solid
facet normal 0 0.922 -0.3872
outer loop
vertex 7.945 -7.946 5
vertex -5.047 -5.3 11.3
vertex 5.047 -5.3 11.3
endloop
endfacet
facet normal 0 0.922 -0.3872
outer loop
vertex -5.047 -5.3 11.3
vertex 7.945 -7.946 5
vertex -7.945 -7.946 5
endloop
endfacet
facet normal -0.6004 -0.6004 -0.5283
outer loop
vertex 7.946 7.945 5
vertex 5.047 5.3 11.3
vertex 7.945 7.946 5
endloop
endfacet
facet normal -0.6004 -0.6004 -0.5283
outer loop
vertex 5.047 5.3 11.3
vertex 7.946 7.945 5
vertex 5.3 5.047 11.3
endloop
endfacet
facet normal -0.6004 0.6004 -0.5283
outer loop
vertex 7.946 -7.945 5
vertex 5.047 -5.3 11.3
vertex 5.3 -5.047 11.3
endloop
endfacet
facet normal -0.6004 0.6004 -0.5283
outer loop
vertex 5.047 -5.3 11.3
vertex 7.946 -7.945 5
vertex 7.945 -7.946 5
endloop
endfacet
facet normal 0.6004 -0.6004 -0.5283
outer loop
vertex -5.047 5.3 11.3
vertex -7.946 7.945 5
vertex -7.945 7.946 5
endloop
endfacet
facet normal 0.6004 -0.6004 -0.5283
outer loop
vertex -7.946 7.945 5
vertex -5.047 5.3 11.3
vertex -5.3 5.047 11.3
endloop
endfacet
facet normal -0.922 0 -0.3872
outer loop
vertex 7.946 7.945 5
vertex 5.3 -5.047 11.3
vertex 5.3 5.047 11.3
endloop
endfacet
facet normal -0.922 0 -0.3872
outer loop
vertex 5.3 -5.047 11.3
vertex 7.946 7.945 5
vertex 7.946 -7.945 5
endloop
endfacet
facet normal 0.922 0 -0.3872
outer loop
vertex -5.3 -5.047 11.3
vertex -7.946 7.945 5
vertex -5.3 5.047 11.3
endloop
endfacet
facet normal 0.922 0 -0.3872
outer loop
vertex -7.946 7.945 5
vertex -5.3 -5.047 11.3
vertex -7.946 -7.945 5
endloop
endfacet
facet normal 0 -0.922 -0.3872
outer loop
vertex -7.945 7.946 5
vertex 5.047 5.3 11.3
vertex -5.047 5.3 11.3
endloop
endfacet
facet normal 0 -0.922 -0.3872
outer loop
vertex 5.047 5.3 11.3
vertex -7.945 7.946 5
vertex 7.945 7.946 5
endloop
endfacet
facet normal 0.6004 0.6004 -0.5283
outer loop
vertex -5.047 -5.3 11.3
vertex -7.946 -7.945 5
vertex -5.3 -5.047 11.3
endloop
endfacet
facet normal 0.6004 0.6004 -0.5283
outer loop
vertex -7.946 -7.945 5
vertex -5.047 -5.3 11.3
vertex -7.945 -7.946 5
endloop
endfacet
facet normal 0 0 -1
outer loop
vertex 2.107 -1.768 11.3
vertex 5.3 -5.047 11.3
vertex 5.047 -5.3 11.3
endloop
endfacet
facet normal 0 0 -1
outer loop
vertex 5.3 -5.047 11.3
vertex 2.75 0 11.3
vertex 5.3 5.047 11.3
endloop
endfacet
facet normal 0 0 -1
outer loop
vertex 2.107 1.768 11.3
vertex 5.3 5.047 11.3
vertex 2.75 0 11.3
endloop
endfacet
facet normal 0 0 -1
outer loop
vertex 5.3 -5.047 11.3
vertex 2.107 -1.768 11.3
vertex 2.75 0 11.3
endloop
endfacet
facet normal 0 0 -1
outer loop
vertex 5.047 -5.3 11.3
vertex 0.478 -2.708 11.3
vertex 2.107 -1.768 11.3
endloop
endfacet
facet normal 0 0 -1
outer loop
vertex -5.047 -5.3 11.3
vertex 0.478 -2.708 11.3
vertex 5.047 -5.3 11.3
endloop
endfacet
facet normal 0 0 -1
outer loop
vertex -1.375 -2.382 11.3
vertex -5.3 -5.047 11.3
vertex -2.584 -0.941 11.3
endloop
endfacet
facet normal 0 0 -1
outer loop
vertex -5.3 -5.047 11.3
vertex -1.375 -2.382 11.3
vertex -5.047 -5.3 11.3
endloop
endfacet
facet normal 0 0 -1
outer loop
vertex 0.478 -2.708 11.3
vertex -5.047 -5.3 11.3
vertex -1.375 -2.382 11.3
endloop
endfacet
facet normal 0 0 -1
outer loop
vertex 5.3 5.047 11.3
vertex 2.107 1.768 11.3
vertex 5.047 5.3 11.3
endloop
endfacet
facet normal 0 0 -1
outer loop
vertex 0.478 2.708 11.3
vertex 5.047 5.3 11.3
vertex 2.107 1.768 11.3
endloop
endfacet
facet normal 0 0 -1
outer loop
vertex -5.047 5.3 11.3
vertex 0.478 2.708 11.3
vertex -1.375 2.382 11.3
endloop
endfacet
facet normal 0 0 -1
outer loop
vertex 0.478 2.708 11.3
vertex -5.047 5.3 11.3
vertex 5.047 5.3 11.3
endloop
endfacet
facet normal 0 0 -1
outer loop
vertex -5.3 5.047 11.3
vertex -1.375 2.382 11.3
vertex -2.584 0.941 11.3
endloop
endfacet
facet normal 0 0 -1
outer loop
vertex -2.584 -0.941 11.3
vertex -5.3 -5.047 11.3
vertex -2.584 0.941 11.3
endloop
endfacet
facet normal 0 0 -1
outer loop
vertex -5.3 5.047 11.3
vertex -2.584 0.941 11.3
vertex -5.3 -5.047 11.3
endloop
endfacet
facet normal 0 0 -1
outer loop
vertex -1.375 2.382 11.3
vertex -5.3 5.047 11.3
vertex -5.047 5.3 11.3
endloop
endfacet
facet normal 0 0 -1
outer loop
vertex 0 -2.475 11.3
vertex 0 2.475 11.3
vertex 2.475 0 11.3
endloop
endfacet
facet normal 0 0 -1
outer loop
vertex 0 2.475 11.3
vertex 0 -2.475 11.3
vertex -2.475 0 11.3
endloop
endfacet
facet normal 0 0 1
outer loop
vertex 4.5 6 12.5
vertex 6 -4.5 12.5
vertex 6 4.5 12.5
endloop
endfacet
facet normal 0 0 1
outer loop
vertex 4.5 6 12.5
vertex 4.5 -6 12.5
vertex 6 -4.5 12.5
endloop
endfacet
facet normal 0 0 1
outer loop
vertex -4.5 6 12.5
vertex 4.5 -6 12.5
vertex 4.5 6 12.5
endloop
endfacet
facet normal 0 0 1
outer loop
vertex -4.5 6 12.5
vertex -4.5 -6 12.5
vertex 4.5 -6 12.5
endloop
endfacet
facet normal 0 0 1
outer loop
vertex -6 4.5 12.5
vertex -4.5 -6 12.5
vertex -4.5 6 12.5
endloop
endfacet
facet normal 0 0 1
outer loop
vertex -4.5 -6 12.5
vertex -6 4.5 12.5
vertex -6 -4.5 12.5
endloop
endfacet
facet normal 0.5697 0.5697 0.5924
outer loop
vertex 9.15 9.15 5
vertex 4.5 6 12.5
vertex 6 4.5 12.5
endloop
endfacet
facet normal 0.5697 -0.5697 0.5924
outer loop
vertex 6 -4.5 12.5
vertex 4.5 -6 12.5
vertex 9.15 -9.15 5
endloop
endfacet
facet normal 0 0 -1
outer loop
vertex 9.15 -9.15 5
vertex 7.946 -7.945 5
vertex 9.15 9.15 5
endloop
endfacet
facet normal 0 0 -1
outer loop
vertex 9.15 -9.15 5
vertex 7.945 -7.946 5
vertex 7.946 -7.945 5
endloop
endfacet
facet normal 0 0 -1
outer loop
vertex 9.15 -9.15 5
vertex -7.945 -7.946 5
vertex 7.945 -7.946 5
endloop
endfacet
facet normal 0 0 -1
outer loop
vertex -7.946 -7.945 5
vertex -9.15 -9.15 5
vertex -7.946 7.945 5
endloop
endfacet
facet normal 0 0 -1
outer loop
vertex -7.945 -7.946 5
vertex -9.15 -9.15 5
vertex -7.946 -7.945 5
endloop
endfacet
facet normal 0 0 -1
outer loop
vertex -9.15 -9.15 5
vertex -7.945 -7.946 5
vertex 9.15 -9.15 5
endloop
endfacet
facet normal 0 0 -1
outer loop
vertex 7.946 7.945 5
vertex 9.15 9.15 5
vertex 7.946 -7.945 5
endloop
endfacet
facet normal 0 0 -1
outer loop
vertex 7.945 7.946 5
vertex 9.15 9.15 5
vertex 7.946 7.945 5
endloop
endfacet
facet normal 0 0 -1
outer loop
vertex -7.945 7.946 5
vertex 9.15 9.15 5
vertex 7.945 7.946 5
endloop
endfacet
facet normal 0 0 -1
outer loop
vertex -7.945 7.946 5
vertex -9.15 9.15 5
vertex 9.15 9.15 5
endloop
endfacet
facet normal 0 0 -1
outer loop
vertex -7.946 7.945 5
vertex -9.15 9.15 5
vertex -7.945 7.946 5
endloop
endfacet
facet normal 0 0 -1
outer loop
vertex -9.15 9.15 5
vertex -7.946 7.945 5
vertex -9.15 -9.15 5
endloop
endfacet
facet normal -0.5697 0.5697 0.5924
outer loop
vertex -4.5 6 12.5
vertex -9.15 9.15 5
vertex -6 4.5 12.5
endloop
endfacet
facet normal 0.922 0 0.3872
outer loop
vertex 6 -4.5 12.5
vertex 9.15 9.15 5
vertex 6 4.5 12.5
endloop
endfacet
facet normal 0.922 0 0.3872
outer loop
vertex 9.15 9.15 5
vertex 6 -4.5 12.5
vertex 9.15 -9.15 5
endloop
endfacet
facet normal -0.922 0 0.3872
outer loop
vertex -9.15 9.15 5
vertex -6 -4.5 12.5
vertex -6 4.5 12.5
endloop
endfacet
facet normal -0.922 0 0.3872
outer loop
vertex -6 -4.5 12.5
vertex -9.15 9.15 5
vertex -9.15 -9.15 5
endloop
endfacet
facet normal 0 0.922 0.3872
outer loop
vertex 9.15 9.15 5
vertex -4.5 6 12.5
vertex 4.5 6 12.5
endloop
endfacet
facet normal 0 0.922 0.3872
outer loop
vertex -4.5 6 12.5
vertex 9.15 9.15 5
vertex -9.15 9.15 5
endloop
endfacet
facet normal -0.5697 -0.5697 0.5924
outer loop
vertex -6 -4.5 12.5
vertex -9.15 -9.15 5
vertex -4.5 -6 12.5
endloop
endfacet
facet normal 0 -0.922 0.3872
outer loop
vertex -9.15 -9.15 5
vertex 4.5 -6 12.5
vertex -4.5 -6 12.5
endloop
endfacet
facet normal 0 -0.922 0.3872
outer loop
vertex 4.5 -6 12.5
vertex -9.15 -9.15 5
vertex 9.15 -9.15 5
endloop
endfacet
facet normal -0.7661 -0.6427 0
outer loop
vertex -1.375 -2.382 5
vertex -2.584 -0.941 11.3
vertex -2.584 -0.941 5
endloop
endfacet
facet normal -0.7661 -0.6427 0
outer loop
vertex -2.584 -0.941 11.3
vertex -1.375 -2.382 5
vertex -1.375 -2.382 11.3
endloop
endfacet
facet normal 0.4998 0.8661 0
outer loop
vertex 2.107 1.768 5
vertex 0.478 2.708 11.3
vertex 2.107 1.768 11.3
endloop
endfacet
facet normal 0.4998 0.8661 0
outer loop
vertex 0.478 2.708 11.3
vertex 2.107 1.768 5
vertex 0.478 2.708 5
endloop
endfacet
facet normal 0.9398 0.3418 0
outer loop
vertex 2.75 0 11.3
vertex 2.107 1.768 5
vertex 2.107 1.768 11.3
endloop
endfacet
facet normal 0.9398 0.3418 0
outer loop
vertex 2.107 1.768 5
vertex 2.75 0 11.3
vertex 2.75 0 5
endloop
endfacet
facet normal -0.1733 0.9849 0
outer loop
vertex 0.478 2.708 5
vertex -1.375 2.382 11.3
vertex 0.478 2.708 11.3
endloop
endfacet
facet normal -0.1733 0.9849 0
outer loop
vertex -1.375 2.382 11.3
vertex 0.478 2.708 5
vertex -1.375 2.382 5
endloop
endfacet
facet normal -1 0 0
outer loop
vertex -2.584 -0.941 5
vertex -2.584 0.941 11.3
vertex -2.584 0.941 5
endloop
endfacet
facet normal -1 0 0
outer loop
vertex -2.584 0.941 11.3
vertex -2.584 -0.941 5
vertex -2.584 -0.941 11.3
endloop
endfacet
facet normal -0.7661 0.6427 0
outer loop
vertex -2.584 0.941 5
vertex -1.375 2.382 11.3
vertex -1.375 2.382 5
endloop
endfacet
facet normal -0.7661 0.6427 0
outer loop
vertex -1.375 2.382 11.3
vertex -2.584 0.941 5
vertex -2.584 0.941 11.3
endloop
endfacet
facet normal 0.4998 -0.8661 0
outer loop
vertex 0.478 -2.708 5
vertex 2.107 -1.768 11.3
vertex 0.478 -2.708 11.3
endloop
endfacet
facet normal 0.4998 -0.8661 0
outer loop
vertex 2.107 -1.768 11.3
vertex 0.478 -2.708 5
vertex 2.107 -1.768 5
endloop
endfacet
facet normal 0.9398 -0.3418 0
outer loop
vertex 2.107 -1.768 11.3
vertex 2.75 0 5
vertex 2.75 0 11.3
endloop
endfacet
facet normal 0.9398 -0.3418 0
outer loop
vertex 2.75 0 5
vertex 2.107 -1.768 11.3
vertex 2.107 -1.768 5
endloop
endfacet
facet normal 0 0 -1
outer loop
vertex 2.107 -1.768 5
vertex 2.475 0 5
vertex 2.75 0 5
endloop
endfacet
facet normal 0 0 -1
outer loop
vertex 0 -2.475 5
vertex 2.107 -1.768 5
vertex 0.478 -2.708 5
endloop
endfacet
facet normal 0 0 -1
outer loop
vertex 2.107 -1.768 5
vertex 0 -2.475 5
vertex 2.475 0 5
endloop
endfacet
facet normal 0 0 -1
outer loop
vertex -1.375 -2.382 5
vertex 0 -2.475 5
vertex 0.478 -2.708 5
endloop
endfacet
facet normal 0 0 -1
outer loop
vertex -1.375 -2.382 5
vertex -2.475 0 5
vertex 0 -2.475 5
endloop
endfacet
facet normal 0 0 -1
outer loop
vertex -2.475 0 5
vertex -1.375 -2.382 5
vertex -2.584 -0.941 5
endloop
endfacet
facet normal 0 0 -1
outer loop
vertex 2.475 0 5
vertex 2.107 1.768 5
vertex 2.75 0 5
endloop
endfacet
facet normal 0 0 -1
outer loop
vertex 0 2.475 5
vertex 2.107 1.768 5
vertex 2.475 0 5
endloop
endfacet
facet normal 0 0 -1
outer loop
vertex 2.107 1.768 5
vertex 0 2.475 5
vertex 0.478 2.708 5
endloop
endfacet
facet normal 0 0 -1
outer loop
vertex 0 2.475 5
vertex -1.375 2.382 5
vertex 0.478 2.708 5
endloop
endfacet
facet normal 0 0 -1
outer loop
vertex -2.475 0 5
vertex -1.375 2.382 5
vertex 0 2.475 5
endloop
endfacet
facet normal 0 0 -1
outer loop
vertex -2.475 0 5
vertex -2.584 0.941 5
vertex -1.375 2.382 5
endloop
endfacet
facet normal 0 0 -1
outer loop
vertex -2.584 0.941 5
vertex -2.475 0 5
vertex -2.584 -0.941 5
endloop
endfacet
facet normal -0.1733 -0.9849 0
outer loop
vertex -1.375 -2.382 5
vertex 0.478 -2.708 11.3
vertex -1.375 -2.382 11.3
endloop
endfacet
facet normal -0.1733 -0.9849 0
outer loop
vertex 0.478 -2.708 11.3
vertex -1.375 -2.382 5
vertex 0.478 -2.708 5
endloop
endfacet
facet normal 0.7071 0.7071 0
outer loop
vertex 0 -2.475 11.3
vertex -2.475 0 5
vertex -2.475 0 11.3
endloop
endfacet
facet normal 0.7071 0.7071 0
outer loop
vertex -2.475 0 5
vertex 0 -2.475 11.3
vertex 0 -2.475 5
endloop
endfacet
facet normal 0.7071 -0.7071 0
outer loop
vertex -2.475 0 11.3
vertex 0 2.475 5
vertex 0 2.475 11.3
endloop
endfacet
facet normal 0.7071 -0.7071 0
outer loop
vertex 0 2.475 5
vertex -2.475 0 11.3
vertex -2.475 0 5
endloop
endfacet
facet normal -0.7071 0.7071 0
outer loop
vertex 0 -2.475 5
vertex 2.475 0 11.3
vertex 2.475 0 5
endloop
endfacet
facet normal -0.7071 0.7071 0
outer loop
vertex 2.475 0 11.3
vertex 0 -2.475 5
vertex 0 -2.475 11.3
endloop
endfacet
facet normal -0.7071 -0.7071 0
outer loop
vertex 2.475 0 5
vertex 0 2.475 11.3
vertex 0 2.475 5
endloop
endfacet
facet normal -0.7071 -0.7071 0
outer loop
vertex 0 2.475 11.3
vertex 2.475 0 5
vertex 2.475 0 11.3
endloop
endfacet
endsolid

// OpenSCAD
// file: utils.scad
module rounded_square(size=1, center=false, r=1) {
  offset(r)
    offset(-r)
      square(size, center=center);
}

module chamfered_pocket(size=1, h=1) {
  intersection() {
    hull() {
      translate([0,0,h/2])
        cube([size.x, size.y, h], center=true);

      translate([0,0,1.5*h])
        cube([size.x+h*2, size.y+h*2, h], center=true);
    }
    translate([0,0,0.5*h])
      cube([size.x+h*2, size.y+h*2, h], center=true);
  }
}
// main file
use <utils.scad>

module keycap_shape(d1=18.3, d2=12, h=7.5, r=1.5) {
  hull() {
    linear_extrude(1, scale=0.1) square([d1, d1], center=true);
    translate([0, 0, h])
      rotate([180,0,0])
      linear_extrude(1, scale=0.1)
      rounded_square([d2,d2], r=r, center=true);
  }
}

module keycap(down=false) {
  w=1.2;
  translate([0,0,down?1:5]) {
    difference() {
      keycap_shape(d1=18.3, d2=12, h=7.5, r=1.5);
      intersection() {
        translate([0,0,-0.01]) keycap_shape(d1=18.3-2*w, d2=12-2*w, h=7.5, r=1.5-w);
        cube([20, 20, (7.5-w)*2], center=true);
      }
    }
    difference() {
      cylinder(h=7, d=5.5);
      rotate([0,0,45]) cube([3.5, 3.5, 20], center=true);
    }
  }
}

module switch() {
    translate([0,0,-5]) linear_extrude(6) rounded_square([13.5,13.5], r=1, center=true);
    linear_extrude(6, scale=0.8) rounded_square([15.6, 15.6], r=1, center=true);
    translate([0,0,-5]) cylinder(h=6, d=4, center=true);
}

keycap();
